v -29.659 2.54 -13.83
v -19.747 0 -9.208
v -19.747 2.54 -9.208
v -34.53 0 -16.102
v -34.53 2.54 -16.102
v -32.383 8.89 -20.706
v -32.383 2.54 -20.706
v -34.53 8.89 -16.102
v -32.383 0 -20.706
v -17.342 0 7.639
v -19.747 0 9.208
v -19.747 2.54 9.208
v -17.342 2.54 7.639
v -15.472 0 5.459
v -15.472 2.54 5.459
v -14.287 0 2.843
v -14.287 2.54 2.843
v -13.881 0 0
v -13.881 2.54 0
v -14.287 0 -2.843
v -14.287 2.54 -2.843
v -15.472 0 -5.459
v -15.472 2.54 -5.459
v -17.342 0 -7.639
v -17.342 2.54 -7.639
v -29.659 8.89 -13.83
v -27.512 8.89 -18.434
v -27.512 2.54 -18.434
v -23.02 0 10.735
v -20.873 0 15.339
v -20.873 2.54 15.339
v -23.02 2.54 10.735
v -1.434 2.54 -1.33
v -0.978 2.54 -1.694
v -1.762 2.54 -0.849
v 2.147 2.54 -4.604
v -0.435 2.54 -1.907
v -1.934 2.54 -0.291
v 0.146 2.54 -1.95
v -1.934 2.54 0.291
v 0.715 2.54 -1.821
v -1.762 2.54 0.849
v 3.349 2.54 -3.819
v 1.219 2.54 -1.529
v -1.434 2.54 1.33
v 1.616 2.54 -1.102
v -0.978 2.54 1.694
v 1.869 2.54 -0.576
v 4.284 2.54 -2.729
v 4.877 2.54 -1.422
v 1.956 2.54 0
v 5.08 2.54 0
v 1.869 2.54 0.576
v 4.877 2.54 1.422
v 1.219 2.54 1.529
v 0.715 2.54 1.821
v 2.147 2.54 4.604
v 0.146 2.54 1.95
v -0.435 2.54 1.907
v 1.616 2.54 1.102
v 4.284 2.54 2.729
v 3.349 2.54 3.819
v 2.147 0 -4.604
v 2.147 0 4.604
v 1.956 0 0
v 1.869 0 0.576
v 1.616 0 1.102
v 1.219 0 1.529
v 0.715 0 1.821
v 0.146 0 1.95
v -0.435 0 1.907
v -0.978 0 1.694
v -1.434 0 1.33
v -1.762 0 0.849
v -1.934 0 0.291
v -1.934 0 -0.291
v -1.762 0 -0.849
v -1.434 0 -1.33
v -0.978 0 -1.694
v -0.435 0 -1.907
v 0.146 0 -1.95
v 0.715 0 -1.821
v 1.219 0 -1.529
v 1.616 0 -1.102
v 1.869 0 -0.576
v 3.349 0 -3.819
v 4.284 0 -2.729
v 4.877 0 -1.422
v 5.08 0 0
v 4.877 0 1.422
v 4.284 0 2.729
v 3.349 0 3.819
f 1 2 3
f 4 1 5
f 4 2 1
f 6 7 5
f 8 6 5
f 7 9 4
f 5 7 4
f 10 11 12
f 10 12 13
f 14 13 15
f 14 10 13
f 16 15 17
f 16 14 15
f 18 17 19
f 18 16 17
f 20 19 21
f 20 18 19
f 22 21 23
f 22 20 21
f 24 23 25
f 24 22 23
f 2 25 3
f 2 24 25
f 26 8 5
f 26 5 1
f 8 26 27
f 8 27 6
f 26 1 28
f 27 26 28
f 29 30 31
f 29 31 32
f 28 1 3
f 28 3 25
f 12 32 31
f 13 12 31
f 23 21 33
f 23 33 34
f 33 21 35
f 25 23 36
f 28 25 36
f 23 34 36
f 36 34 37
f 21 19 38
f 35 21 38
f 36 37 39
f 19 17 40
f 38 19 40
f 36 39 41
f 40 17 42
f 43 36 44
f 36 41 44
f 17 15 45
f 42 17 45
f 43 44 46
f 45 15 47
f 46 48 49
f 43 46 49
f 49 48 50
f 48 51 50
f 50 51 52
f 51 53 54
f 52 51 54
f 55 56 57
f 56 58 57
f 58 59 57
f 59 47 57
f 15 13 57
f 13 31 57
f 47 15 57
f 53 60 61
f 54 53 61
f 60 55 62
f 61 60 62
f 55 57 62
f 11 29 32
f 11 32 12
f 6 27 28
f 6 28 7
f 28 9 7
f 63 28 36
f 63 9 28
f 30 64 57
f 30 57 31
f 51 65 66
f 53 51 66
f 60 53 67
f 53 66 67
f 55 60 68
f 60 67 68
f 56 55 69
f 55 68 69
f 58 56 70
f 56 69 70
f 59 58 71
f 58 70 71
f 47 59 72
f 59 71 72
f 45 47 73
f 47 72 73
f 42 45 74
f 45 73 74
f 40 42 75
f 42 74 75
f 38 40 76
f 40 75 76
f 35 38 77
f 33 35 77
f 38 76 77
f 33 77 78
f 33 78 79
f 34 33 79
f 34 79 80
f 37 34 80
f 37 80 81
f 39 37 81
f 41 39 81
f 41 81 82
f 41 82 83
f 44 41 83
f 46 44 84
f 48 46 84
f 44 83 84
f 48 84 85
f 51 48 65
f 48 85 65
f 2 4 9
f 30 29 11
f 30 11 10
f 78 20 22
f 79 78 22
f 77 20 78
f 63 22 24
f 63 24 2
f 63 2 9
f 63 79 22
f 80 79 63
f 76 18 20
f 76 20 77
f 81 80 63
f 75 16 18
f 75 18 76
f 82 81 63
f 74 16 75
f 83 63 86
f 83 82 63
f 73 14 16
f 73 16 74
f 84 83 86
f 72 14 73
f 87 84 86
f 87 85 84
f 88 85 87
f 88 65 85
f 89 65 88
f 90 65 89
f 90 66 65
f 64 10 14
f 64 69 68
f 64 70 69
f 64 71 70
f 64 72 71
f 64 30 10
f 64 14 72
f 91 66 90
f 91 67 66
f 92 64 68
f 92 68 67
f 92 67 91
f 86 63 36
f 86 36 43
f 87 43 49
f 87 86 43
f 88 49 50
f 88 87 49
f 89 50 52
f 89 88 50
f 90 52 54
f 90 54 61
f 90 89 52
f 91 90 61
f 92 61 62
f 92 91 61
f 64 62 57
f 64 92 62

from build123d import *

# Parameters (mm, degrees)
F0_R     = 1.9558
F1_DEPTH = 2.54
F3_DEPTH = 6.35


with BuildPart() as f1:
    # F0 (on Front) → F1 (new body)
    with BuildSketch(Plane.XZ):
        with BuildLine():
            ThreePointArc((2.146901, -4.604044), (5.08, 0), (2.146901, 4.604044))
            Line((2.146901, 4.604044), (-20.873317, 15.338547))
            Line((-20.873317, 15.338547), (-23.020218, 10.734504))
            Line((-23.020218, 10.734504), (-19.746807, 9.208087))
            ThreePointArc((-19.746807, 9.208087), (-13.880608, 0), (-19.746807, -9.208087))
            Line((-19.746807, -9.208087), (-34.530327, -16.101756))
            Line((-34.530327, -16.101756), (-32.383426, -20.705799))
            Line((-32.383426, -20.705799), (2.146901, -4.604044))
        make_face()
        Circle(F0_R, mode=Mode.SUBTRACT)
    extrude(amount=-F1_DEPTH)

    # F2 (on face) → F3 (join)
    with BuildSketch(Plane(origin=(0, 2.54, 0), x_dir=(-1, 0, 0), z_dir=(0, 1, 0))):
        Polygon((32.383426, -20.705799), (34.530327, -16.101756), (29.658666, -13.830063), (27.511766, -18.434107), align=None)
    extrude(amount=F3_DEPTH)


solid = f1.part
